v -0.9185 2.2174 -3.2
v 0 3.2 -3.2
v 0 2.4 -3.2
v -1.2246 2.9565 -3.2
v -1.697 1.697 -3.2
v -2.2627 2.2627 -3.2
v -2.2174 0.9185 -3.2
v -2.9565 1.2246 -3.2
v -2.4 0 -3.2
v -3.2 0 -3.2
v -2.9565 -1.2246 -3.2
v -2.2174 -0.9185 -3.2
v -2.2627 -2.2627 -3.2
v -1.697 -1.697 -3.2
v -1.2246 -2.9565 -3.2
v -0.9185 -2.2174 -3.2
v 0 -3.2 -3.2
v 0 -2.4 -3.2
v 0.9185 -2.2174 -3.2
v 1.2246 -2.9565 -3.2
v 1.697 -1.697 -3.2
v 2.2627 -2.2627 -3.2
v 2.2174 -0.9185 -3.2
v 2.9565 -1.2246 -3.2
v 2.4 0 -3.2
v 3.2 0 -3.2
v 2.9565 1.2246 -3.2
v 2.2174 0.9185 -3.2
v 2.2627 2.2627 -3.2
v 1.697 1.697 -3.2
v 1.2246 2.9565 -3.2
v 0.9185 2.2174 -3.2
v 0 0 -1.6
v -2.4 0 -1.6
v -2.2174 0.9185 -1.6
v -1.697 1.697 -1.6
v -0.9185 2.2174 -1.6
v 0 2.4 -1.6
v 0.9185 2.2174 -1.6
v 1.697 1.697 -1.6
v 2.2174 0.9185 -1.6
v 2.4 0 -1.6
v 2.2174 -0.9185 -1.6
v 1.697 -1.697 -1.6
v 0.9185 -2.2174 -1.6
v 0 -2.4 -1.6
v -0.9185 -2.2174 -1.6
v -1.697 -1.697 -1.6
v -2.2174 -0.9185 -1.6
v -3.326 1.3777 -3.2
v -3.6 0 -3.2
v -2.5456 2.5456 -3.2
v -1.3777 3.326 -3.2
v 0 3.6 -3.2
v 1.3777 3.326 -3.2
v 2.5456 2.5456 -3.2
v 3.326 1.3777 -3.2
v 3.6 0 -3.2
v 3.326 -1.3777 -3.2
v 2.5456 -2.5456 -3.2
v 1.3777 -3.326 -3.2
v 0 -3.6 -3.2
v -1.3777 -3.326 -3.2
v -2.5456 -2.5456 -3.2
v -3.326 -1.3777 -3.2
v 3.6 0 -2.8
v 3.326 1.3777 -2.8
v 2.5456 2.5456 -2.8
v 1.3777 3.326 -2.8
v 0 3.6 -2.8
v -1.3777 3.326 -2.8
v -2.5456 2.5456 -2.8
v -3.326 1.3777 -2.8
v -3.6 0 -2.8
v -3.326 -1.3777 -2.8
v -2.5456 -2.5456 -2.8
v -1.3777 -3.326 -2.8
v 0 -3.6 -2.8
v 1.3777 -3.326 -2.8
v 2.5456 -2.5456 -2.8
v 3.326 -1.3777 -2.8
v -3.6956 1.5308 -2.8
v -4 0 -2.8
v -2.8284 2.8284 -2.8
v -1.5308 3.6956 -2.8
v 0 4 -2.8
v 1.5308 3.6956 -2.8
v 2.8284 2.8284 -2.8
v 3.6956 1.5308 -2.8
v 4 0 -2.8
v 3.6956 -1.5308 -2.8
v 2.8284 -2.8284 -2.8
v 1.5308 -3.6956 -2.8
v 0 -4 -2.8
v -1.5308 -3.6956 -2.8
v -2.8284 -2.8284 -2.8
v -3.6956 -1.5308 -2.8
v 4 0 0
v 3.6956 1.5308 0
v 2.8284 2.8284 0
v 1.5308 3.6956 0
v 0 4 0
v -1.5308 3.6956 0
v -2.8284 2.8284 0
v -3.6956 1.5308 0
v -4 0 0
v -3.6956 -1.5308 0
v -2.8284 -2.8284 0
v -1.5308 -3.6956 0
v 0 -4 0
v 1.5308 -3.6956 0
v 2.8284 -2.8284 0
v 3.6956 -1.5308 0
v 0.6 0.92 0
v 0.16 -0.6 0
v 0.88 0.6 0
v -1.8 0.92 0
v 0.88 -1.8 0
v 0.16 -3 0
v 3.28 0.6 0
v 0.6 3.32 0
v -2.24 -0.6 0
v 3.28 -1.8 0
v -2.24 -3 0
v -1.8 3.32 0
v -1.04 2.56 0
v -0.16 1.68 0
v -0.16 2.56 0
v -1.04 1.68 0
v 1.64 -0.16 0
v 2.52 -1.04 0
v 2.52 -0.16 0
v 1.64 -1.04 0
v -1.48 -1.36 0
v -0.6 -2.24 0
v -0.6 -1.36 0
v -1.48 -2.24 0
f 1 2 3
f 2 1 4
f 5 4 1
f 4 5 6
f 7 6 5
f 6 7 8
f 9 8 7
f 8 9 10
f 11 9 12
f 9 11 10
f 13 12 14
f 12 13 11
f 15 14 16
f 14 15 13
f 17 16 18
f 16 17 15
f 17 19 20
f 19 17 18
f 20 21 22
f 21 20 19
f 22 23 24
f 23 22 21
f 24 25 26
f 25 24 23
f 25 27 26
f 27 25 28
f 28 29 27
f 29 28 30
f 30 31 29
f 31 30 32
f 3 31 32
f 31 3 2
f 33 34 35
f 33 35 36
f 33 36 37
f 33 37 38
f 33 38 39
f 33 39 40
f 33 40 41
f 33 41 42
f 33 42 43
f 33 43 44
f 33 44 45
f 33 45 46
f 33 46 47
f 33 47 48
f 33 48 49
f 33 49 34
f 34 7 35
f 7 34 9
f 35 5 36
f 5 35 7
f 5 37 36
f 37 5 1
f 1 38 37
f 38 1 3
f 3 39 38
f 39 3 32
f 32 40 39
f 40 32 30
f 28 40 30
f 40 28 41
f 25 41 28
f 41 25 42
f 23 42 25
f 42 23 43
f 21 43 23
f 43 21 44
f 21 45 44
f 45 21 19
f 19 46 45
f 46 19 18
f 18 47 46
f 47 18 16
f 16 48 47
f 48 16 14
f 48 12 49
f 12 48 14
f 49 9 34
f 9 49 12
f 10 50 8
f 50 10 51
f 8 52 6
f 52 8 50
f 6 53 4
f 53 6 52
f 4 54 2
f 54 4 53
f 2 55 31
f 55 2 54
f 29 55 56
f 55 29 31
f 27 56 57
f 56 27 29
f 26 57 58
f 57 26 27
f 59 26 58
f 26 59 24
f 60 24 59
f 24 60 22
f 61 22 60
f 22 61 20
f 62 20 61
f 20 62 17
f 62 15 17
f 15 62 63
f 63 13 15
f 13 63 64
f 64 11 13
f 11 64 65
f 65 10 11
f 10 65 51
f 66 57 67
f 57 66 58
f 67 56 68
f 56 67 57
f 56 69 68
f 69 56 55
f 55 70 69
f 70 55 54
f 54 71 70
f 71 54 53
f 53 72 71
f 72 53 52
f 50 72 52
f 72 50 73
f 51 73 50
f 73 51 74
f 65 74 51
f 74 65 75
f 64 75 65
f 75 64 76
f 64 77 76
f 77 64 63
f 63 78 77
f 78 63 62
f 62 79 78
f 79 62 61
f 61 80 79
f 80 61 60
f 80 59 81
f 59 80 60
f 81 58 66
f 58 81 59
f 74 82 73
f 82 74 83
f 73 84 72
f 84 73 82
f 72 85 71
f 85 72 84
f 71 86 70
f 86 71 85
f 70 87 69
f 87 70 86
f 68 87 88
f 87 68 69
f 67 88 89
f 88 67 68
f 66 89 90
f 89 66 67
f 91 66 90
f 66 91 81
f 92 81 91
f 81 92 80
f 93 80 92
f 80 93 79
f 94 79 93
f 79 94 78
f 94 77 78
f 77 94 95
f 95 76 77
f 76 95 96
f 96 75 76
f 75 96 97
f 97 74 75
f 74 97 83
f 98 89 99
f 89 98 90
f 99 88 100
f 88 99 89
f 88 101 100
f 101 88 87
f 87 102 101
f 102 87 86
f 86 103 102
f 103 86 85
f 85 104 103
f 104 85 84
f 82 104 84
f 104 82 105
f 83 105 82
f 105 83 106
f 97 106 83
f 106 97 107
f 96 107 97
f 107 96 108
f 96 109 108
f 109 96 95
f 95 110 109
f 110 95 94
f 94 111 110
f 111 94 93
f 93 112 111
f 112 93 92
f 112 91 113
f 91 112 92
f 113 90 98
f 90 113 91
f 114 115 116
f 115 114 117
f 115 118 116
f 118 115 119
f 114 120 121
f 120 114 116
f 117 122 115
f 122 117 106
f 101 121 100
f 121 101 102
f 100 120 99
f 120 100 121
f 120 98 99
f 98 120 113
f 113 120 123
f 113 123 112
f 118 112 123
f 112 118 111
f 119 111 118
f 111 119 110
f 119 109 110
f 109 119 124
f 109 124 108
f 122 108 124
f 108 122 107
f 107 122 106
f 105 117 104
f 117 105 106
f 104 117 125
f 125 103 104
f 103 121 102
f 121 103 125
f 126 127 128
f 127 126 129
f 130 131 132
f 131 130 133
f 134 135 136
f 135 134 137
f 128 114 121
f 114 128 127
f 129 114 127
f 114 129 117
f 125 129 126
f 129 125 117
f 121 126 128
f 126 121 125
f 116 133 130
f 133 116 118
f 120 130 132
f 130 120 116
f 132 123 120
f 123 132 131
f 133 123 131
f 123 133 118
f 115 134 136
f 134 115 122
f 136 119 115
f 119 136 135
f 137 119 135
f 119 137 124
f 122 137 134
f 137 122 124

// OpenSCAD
// file: ../p/4-4disc.scad
use <../lib.scad>
function ldraw_lib__4_4disc() = [
// 0 Disc 1.0
// 0 Name: 4-4disc.dat
// 0 Author: James Jessiman
// 0 !LDRAW_ORG Primitive UPDATE 2002-02
// 0 !LICENSE Licensed under CC BY 4.0 : see CAreadme.txt
// 
// 0 BFC CERTIFY CCW
  [0,"BFC","CERTIFY"],
  [0,"BFC","CCW"],
// 
// 0 !HISTORY 1998-12-15 [PTadmin] Official Update 1998-10
// 0 !HISTORY 2002-03-23 [sbliss] Added BFC statement
// 0 !HISTORY 2002-04-25 [PTadmin] Official Update 2002-02
// 0 !HISTORY 2007-06-24 [PTadmin] Header formatted for Contributor Agreement
// 0 !HISTORY 2008-07-01 [PTadmin] Official Update 2008-01
// 
// 
// 3 16 0 0 0 1 0 0 0.9239 0 0.3827
  [3,16,0,0,0,1,0,0,0.9239,0,0.3827],
// 3 16 0 0 0 0.9239 0 0.3827 0.7071 0 0.7071
  [3,16,0,0,0,0.9239,0,0.3827,0.7071,0,0.7071],
// 3 16 0 0 0 0.7071 0 0.7071 0.3827 0 0.9239
  [3,16,0,0,0,0.7071,0,0.7071,0.3827,0,0.9239],
// 3 16 0 0 0 0.3827 0 0.9239 0 0 1
  [3,16,0,0,0,0.3827,0,0.9239,0,0,1],
// 3 16 0 0 0 0 0 1 -0.3827 0 0.9239
  [3,16,0,0,0,0,0,1,-0.3827,0,0.9239],
// 3 16 0 0 0 -0.3827 0 0.9239 -0.7071 0 0.7071
  [3,16,0,0,0,-0.3827,0,0.9239,-0.7071,0,0.7071],
// 3 16 0 0 0 -0.7071 0 0.7071 -0.9239 0 0.3827
  [3,16,0,0,0,-0.7071,0,0.7071,-0.9239,0,0.3827],
// 3 16 0 0 0 -0.9239 0 0.3827 -1 0 -0
  [3,16,0,0,0,-0.9239,0,0.3827,-1,0,-0],
// 3 16 0 0 0 -1 0 -0 -0.9239 0 -0.3827
  [3,16,0,0,0,-1,0,-0,-0.9239,0,-0.3827],
// 3 16 0 0 0 -0.9239 0 -0.3827 -0.7071 0 -0.7071
  [3,16,0,0,0,-0.9239,0,-0.3827,-0.7071,0,-0.7071],
// 3 16 0 0 0 -0.7071 0 -0.7071 -0.3827 0 -0.9239
  [3,16,0,0,0,-0.7071,0,-0.7071,-0.3827,0,-0.9239],
// 3 16 0 0 0 -0.3827 0 -0.9239 0 0 -1
  [3,16,0,0,0,-0.3827,0,-0.9239,0,0,-1],
// 3 16 0 0 0 0 0 -1 0.3827 0 -0.9239
  [3,16,0,0,0,0,0,-1,0.3827,0,-0.9239],
// 3 16 0 0 0 0.3827 0 -0.9239 0.7071 0 -0.7071
  [3,16,0,0,0,0.3827,0,-0.9239,0.7071,0,-0.7071],
// 3 16 0 0 0 0.7071 0 -0.7071 0.9239 0 -0.3827
  [3,16,0,0,0,0.7071,0,-0.7071,0.9239,0,-0.3827],
// 3 16 0 0 0 0.9239 0 -0.3827 1 0 0
  [3,16,0,0,0,0.9239,0,-0.3827,1,0,0],
// 0
];
module ldraw_lib__4_4disc(step=0, col=false, unit=2/5, alt=false, line=0.2, solid=!$preview)
    makepoly(ldraw_lib__4_4disc(), step=step, col=col, unit=unit, alt=alt, line=line, solid=solid);
ldraw_lib__4_4disc(line=0.2);
// file: ../p/4-4ring3.scad
use <../lib.scad>
function ldraw_lib__4_4ring3() = [
// 0 Ring  3 x 1.0
// 0 Name: 4-4ring3.dat
// 0 Author: James Jessiman
// 0 !LDRAW_ORG Primitive UPDATE 2009-01
// 0 !LICENSE Licensed under CC BY 4.0 : see CAreadme.txt
// 
// 0 BFC CERTIFY CCW
  [0,"BFC","CERTIFY"],
  [0,"BFC","CCW"],
// 
// 0 !HISTORY 1998-12-15 [PTadmin] Official Update 1998-10
// 0 !HISTORY 2002-04-05 [hafhead] Added BFC statement
// 0 !HISTORY 2002-04-25 [PTadmin] Official Update 2002-02
// 0 !HISTORY 2007-06-24 [PTadmin] Header formatted for Contributor Agreement
// 0 !HISTORY 2008-07-01 [PTadmin] Official Update 2008-01
// 0 !HISTORY 2008-08-26 [cwdee] Switch polygon winding and rename
// 0 !HISTORY 2009-05-02 [PTadmin] Official Update 2009-01
// 
// 
// 4 16 -1.5308 0 3.6956 -1.1481 0 2.7717 0 0 3 0 0 4
  [4,16,-1.5308,0,3.6956,-1.1481,0,2.7717,0,0,3,0,0,4],
// 4 16 -2.8284 0 2.8284 -2.1213 0 2.1213 -1.1481 0 2.7717 -1.5308 0 3.6956
  [4,16,-2.8284,0,2.8284,-2.1213,0,2.1213,-1.1481,0,2.7717,-1.5308,0,3.6956],
// 4 16 -3.6956 0 1.5308 -2.7717 0 1.1481 -2.1213 0 2.1213 -2.8284 0 2.8284
  [4,16,-3.6956,0,1.5308,-2.7717,0,1.1481,-2.1213,0,2.1213,-2.8284,0,2.8284],
// 4 16 -4 0 0 -3 0 0 -2.7717 0 1.1481 -3.6956 0 1.5308
  [4,16,-4,0,0,-3,0,0,-2.7717,0,1.1481,-3.6956,0,1.5308],
// 4 16 -3.6956 0 -1.5308 -2.7717 0 -1.1481 -3 0 0 -4 0 0
  [4,16,-3.6956,0,-1.5308,-2.7717,0,-1.1481,-3,0,0,-4,0,0],
// 4 16 -2.8284 0 -2.8284 -2.1213 0 -2.1213 -2.7717 0 -1.1481 -3.6956 0 -1.5308
  [4,16,-2.8284,0,-2.8284,-2.1213,0,-2.1213,-2.7717,0,-1.1481,-3.6956,0,-1.5308],
// 4 16 -1.5308 0 -3.6956 -1.1481 0 -2.7717 -2.1213 0 -2.1213 -2.8284 0 -2.8284
  [4,16,-1.5308,0,-3.6956,-1.1481,0,-2.7717,-2.1213,0,-2.1213,-2.8284,0,-2.8284],
// 4 16 0 0 -4 0 0 -3 -1.1481 0 -2.7717 -1.5308 0 -3.6956
  [4,16,0,0,-4,0,0,-3,-1.1481,0,-2.7717,-1.5308,0,-3.6956],
// 4 16 1.5308 0 -3.6956 1.1481 0 -2.7717 0 0 -3 0 0 -4
  [4,16,1.5308,0,-3.6956,1.1481,0,-2.7717,0,0,-3,0,0,-4],
// 4 16 2.8284 0 -2.8284 2.1213 0 -2.1213 1.1481 0 -2.7717 1.5308 0 -3.6956
  [4,16,2.8284,0,-2.8284,2.1213,0,-2.1213,1.1481,0,-2.7717,1.5308,0,-3.6956],
// 4 16 3.6956 0 -1.5308 2.7717 0 -1.1481 2.1213 0 -2.1213 2.8284 0 -2.8284
  [4,16,3.6956,0,-1.5308,2.7717,0,-1.1481,2.1213,0,-2.1213,2.8284,0,-2.8284],
// 4 16 4 0 0 3 0 0 2.7717 0 -1.1481 3.6956 0 -1.5308
  [4,16,4,0,0,3,0,0,2.7717,0,-1.1481,3.6956,0,-1.5308],
// 4 16 3.6956 0 1.5308 2.7717 0 1.1481 3 0 0 4 0 0
  [4,16,3.6956,0,1.5308,2.7717,0,1.1481,3,0,0,4,0,0],
// 4 16 2.8284 0 2.8284 2.1213 0 2.1213 2.7717 0 1.1481 3.6956 0 1.5308
  [4,16,2.8284,0,2.8284,2.1213,0,2.1213,2.7717,0,1.1481,3.6956,0,1.5308],
// 4 16 1.5308 0 3.6956 1.1481 0 2.7717 2.1213 0 2.1213 2.8284 0 2.8284
  [4,16,1.5308,0,3.6956,1.1481,0,2.7717,2.1213,0,2.1213,2.8284,0,2.8284],
// 4 16 0 0 4 0 0 3 1.1481 0 2.7717 1.5308 0 3.6956
  [4,16,0,0,4,0,0,3,1.1481,0,2.7717,1.5308,0,3.6956],
// 0
];
module ldraw_lib__4_4ring3(step=0, col=false, unit=2/5, alt=false, line=0.2, solid=!$preview)
    makepoly(ldraw_lib__4_4ring3(), step=step, col=col, unit=unit, alt=alt, line=line, solid=solid);
ldraw_lib__4_4ring3(line=0.2);
// file: ../p/4-4cylc.scad
use <../lib.scad>
use <4-4cyli.scad>
use <4-4disc.scad>
use <4-4edge.scad>
function ldraw_lib__4_4cylc() = [
// 0 Cylinder Closed 1.0
// 0 Name: 4-4cylc.dat
// 0 Author: Alex Taylor [anathema]
// 0 !LDRAW_ORG Primitive UPDATE 2009-02
// 0 !LICENSE Licensed under CC BY 4.0 : see CAreadme.txt
// 
// 0 BFC CERTIFY CCW
  [0,"BFC","CERTIFY"],
  [0,"BFC","CCW"],
// 
// 0 !HISTORY 2008-12-29 [cwdee] Removed one disc
// 0 !HISTORY 2009-09-03 [PTadmin] Official Update 2009-02
// 
// 
// 1 16 0 0 0 1 0 0 0 1 0 0 0 1 4-4edge.dat
  [1,16,0,0,0,1,0,0,0,1,0,0,0,1, ldraw_lib__4_4edge()],
// 1 16 0 1 0 1 0 0 0 1 0 0 0 1 4-4edge.dat
  [1,16,0,1,0,1,0,0,0,1,0,0,0,1, ldraw_lib__4_4edge()],
// 1 16 0 0 0 1 0 0 0 1 0 0 0 1 4-4disc.dat
  [1,16,0,0,0,1,0,0,0,1,0,0,0,1, ldraw_lib__4_4disc()],
// 1 16 0 0 0 1 0 0 0 1 0 0 0 1 4-4cyli.dat
  [1,16,0,0,0,1,0,0,0,1,0,0,0,1, ldraw_lib__4_4cyli()],
// 0
];
module ldraw_lib__4_4cylc(step=0, col=false, unit=2/5, alt=false, line=0.2, solid=!$preview)
    makepoly(ldraw_lib__4_4cylc(), step=step, col=col, unit=unit, alt=alt, line=line, solid=solid);
ldraw_lib__4_4cylc(line=0.2);
// file: ../p/4-4edge.scad
use <../lib.scad>
function ldraw_lib__4_4edge() = [
// 0 Circle 1.0
// 0 Name: 4-4edge.dat
// 0 Author: James Jessiman
// 0 !LDRAW_ORG Primitive UPDATE 2017-01
// 0 !LICENSE Licensed under CC BY 4.0 : see CAreadme.txt
// 
// 0 BFC CERTIFY CCW
  [0,"BFC","CERTIFY"],
  [0,"BFC","CCW"],
// 
// 0 !HISTORY 1998-12-15 [PTadmin] Official Update 1998-10
// 0 !HISTORY 2005-12-28 [PTadmin] Official Update 2005-01
// 0 !HISTORY 2007-06-24 [PTadmin] Header formatted for Contributor Agreement
// 0 !HISTORY 2008-07-01 [PTadmin] Official Update 2008-01
// 0 !HISTORY 2017-01-15 [Steffen] BFCed
// 0 !HISTORY 2017-12-30 [PTadmin] Official Update 2017-01
// 
// 
// 2 24 1 0 0 0.9239 0 0.3827
  [2,24,1,0,0,0.9239,0,0.3827],
// 2 24 0.9239 0 0.3827 0.7071 0 0.7071
  [2,24,0.9239,0,0.3827,0.7071,0,0.7071],
// 2 24 0.7071 0 0.7071 0.3827 0 0.9239
  [2,24,0.7071,0,0.7071,0.3827,0,0.9239],
// 2 24 0.3827 0 0.9239 0 0 1
  [2,24,0.3827,0,0.9239,0,0,1],
// 2 24 0 0 1 -0.3827 0 0.9239
  [2,24,0,0,1,-0.3827,0,0.9239],
// 2 24 -0.3827 0 0.9239 -0.7071 0 0.7071
  [2,24,-0.3827,0,0.9239,-0.7071,0,0.7071],
// 2 24 -0.7071 0 0.7071 -0.9239 0 0.3827
  [2,24,-0.7071,0,0.7071,-0.9239,0,0.3827],
// 2 24 -0.9239 0 0.3827 -1 0 -0
  [2,24,-0.9239,0,0.3827,-1,0,-0],
// 2 24 -1 0 -0 -0.9239 0 -0.3827
  [2,24,-1,0,-0,-0.9239,0,-0.3827],
// 2 24 -0.9239 0 -0.3827 -0.7071 0 -0.7071
  [2,24,-0.9239,0,-0.3827,-0.7071,0,-0.7071],
// 2 24 -0.7071 0 -0.7071 -0.3827 0 -0.9239
  [2,24,-0.7071,0,-0.7071,-0.3827,0,-0.9239],
// 2 24 -0.3827 0 -0.9239 0 0 -1
  [2,24,-0.3827,0,-0.9239,0,0,-1],
// 2 24 0 0 -1 0.3827 0 -0.9239
  [2,24,0,0,-1,0.3827,0,-0.9239],
// 2 24 0.3827 0 -0.9239 0.7071 0 -0.7071
  [2,24,0.3827,0,-0.9239,0.7071,0,-0.7071],
// 2 24 0.7071 0 -0.7071 0.9239 0 -0.3827
  [2,24,0.7071,0,-0.7071,0.9239,0,-0.3827],
// 2 24 0.9239 0 -0.3827 1 0 0
  [2,24,0.9239,0,-0.3827,1,0,0],
];
module ldraw_lib__4_4edge(step=0, col=false, unit=2/5, alt=false, line=0.2, solid=!$preview)
    makepoly(ldraw_lib__4_4edge(), step=step, col=col, unit=unit, alt=alt, line=line, solid=solid);
ldraw_lib__4_4edge(line=0.2);
// file: ../p/4-4cyli.scad
use <../lib.scad>
function ldraw_lib__4_4cyli() = [
// 0 Cylinder 1.0
// 0 Name: 4-4cyli.dat
// 0 Author: James Jessiman
// 0 !LDRAW_ORG Primitive UPDATE 2005-01
// 0 !LICENSE Licensed under CC BY 4.0 : see CAreadme.txt
// 
// 0 BFC CERTIFY CCW
  [0,"BFC","CERTIFY"],
  [0,"BFC","CCW"],
// 
// 0 !HISTORY 1998-12-15 [PTadmin] Official Update 1998-10
// 0 !HISTORY 2002-03-23 [sbliss] Added BFC statement; merged headers from files in distributions LDraw 0.27 and Complete.
// 0 !HISTORY 2002-04-25 [PTadmin] Official Update 2002-02
// 0 !HISTORY 2004-12-14 [guyvivan] BFC CCW
// 0 !HISTORY 2005-12-28 [PTadmin] Official Update 2005-01
// 0 !HISTORY 2007-06-24 [PTadmin] Header formatted for Contributor Agreement
// 0 !HISTORY 2008-07-01 [PTadmin] Official Update 2008-01
// 
// 
// 4 16 1 1 0 0.9239 1 0.3827 0.9239 0 0.3827 1 0 0
  [4,16,1,1,0,0.9239,1,0.3827,0.9239,0,0.3827,1,0,0],
// 5 24 1 0 0 1 1 0 0.9239 0 0.3827 0.9239 0 -0.3827
  [5,24,1,0,0,1,1,0,0.9239,0,0.3827,0.9239,0,-0.3827],
// 4 16 0.9239 1 0.3827 0.7071 1 0.7071 0.7071 0 0.7071 0.9239 0 0.3827
  [4,16,0.9239,1,0.3827,0.7071,1,0.7071,0.7071,0,0.7071,0.9239,0,0.3827],
// 5 24 0.9239 0 0.3827 0.9239 1 0.3827 0.7071 0 0.7071 1 0 0
  [5,24,0.9239,0,0.3827,0.9239,1,0.3827,0.7071,0,0.7071,1,0,0],
// 4 16 0.7071 1 0.7071 0.3827 1 0.9239 0.3827 0 0.9239 0.7071 0 0.7071
  [4,16,0.7071,1,0.7071,0.3827,1,0.9239,0.3827,0,0.9239,0.7071,0,0.7071],
// 5 24 0.7071 0 0.7071 0.7071 1 0.7071 0.3827 0 0.9239 0.9239 0 0.3827
  [5,24,0.7071,0,0.7071,0.7071,1,0.7071,0.3827,0,0.9239,0.9239,0,0.3827],
// 4 16 0.3827 1 0.9239 0 1 1 0 0 1 0.3827 0 0.9239
  [4,16,0.3827,1,0.9239,0,1,1,0,0,1,0.3827,0,0.9239],
// 5 24 0.3827 0 0.9239 0.3827 1 0.9239 0 0 1 0.7071 0 0.7071
  [5,24,0.3827,0,0.9239,0.3827,1,0.9239,0,0,1,0.7071,0,0.7071],
// 4 16 0 1 1 -0.3827 1 0.9239 -0.3827 0 0.9239 0 0 1
  [4,16,0,1,1,-0.3827,1,0.9239,-0.3827,0,0.9239,0,0,1],
// 5 24 0 0 1 0 1 1 -0.3827 0 0.9239 0.3827 0 0.9239
  [5,24,0,0,1,0,1,1,-0.3827,0,0.9239,0.3827,0,0.9239],
// 4 16 -0.3827 1 0.9239 -0.7071 1 0.7071 -0.7071 0 0.7071 -0.3827 0 0.9239
  [4,16,-0.3827,1,0.9239,-0.7071,1,0.7071,-0.7071,0,0.7071,-0.3827,0,0.9239],
// 5 24 -0.3827 0 0.9239 -0.3827 1 0.9239 -0.7071 0 0.7071 0 0 1
  [5,24,-0.3827,0,0.9239,-0.3827,1,0.9239,-0.7071,0,0.7071,0,0,1],
// 4 16 -0.7071 1 0.7071 -0.9239 1 0.3827 -0.9239 0 0.3827 -0.7071 0 0.7071
  [4,16,-0.7071,1,0.7071,-0.9239,1,0.3827,-0.9239,0,0.3827,-0.7071,0,0.7071],
// 5 24 -0.7071 0 0.7071 -0.7071 1 0.7071 -0.9239 0 0.3827 -0.3827 0 0.9239
  [5,24,-0.7071,0,0.7071,-0.7071,1,0.7071,-0.9239,0,0.3827,-0.3827,0,0.9239],
// 4 16 -0.9239 1 0.3827 -1 1 0 -1 0 0 -0.9239 0 0.3827
  [4,16,-0.9239,1,0.3827,-1,1,0,-1,0,0,-0.9239,0,0.3827],
// 5 24 -0.9239 0 0.3827 -0.9239 1 0.3827 -1 0 0 -0.7071 0 0.7071
  [5,24,-0.9239,0,0.3827,-0.9239,1,0.3827,-1,0,0,-0.7071,0,0.7071],
// 4 16 -1 1 0 -0.9239 1 -0.3827 -0.9239 0 -0.3827 -1 0 0
  [4,16,-1,1,0,-0.9239,1,-0.3827,-0.9239,0,-0.3827,-1,0,0],
// 5 24 -1 0 0 -1 1 0 -0.9239 0 -0.3827 -0.9239 0 0.3827
  [5,24,-1,0,0,-1,1,0,-0.9239,0,-0.3827,-0.9239,0,0.3827],
// 4 16 -0.9239 1 -0.3827 -0.7071 1 -0.7071 -0.7071 0 -0.7071 -0.9239 0 -0.3827
  [4,16,-0.9239,1,-0.3827,-0.7071,1,-0.7071,-0.7071,0,-0.7071,-0.9239,0,-0.3827],
// 5 24 -0.9239 0 -0.3827 -0.9239 1 -0.3827 -0.7071 0 -0.7071 -1 0 0
  [5,24,-0.9239,0,-0.3827,-0.9239,1,-0.3827,-0.7071,0,-0.7071,-1,0,0],
// 4 16 -0.7071 1 -0.7071 -0.3827 1 -0.9239 -0.3827 0 -0.9239 -0.7071 0 -0.7071
  [4,16,-0.7071,1,-0.7071,-0.3827,1,-0.9239,-0.3827,0,-0.9239,-0.7071,0,-0.7071],
// 5 24 -0.7071 0 -0.7071 -0.7071 1 -0.7071 -0.3827 0 -0.9239 -0.9239 0 -0.3827
  [5,24,-0.7071,0,-0.7071,-0.7071,1,-0.7071,-0.3827,0,-0.9239,-0.9239,0,-0.3827],
// 4 16 -0.3827 1 -0.9239 0 1 -1 0 0 -1 -0.3827 0 -0.9239
  [4,16,-0.3827,1,-0.9239,0,1,-1,0,0,-1,-0.3827,0,-0.9239],
// 5 24 -0.3827 0 -0.9239 -0.3827 1 -0.9239 0 0 -1 -0.7071 0 -0.7071
  [5,24,-0.3827,0,-0.9239,-0.3827,1,-0.9239,0,0,-1,-0.7071,0,-0.7071],
// 4 16 0 1 -1 0.3827 1 -0.9239 0.3827 0 -0.9239 0 0 -1
  [4,16,0,1,-1,0.3827,1,-0.9239,0.3827,0,-0.9239,0,0,-1],
// 5 24 0 0 -1 0 1 -1 0.3827 0 -0.9239 -0.3827 0 -0.9239
  [5,24,0,0,-1,0,1,-1,0.3827,0,-0.9239,-0.3827,0,-0.9239],
// 4 16 0.3827 1 -0.9239 0.7071 1 -0.7071 0.7071 0 -0.7071 0.3827 0 -0.9239
  [4,16,0.3827,1,-0.9239,0.7071,1,-0.7071,0.7071,0,-0.7071,0.3827,0,-0.9239],
// 5 24 0.3827 0 -0.9239 0.3827 1 -0.9239 0.7071 0 -0.7071 0 0 -1
  [5,24,0.3827,0,-0.9239,0.3827,1,-0.9239,0.7071,0,-0.7071,0,0,-1],
// 4 16 0.7071 1 -0.7071 0.9239 1 -0.3827 0.9239 0 -0.3827 0.7071 0 -0.7071
  [4,16,0.7071,1,-0.7071,0.9239,1,-0.3827,0.9239,0,-0.3827,0.7071,0,-0.7071],
// 5 24 0.7071 0 -0.7071 0.7071 1 -0.7071 0.9239 0 -0.3827 0.3827 0 -0.9239
  [5,24,0.7071,0,-0.7071,0.7071,1,-0.7071,0.9239,0,-0.3827,0.3827,0,-0.9239],
// 4 16 0.9239 1 -0.3827 1 1 0 1 0 0 0.9239 0 -0.3827
  [4,16,0.9239,1,-0.3827,1,1,0,1,0,0,0.9239,0,-0.3827],
// 5 24 0.9239 0 -0.3827 0.9239 1 -0.3827 1 0 0 0.7071 0 -0.7071
  [5,24,0.9239,0,-0.3827,0.9239,1,-0.3827,1,0,0,0.7071,0,-0.7071],
// 0
];
module ldraw_lib__4_4cyli(step=0, col=false, unit=2/5, alt=false, line=0.2, solid=!$preview)
    makepoly(ldraw_lib__4_4cyli(), step=step, col=col, unit=unit, alt=alt, line=line, solid=solid);
ldraw_lib__4_4cyli(line=0.2);
// file: ../p/empty.scad
use <../lib.scad>
function ldraw_lib__empty() = [
// 0 Empty
// 0 Name: empty.dat
// 0 Author: Steffen [Steffen]
// 0 !LDRAW_ORG Primitive UPDATE 2015-01
// 0 !LICENSE Licensed under CC BY 4.0 : see CAreadme.txt
// 
// 0 BFC CERTIFY CCW
  [0,"BFC","CERTIFY"],
  [0,"BFC","CCW"],
// 
// 0 !HISTORY 2015-10-11 [PTadmin] Official Update 2015-01
// 
// 
// 0 // Tool MLCad cannot handle really empty files. This file is used as a workaround.
// 0 // It exceptionally contains forbidden non-LDRAW standard syntax to satisfy MLCad until it is fixed OR a different editor has become the de-facto LDRAW standard.
// 0 // The line being used here is an "impossible" conditional line which never should be visible,
// 0 // additionally hidden by a syntax explicitly hiding it from displaying.
// 
// 0 MLCAD HIDE 5 24 0 0 0 0.0001 0 0 0.0001 -0.0001 0 0 0 0
];
module ldraw_lib__empty(step=0, col=false, unit=2/5, alt=false, line=0.2, solid=!$preview)
    makepoly(ldraw_lib__empty(), step=step, col=col, unit=unit, alt=alt, line=line, solid=solid);
ldraw_lib__empty(line=0.2);
// file: ../p/stud4o.scad
use <../lib.scad>
use <4-4cylc.scad>
use <4-4ring3.scad>
function ldraw_lib__stud4o() = [
// 0 Stud Tube Open without Outer Cylinder
// 0 Name: stud4o.dat
// 0 Author: Magnus Forsberg [MagFors]
// 0 !LDRAW_ORG Primitive UPDATE 2011-02
// 0 !LICENSE Licensed under CC BY 4.0 : see CAreadme.txt
// 
// 0 !HELP This stud is a "antistud" to be used like a underside stud,
// 0 !HELP but without the outer cylinder.
// 0 !HELP 1 47 0 0 0 1 0 0 0 1 0 0 0 1 stud4.dat
// 
// 0 BFC CERTIFY CCW
  [0,"BFC","CERTIFY"],
  [0,"BFC","CCW"],
// 
// 0 !HISTORY 2011-12-29 [PTadmin] Official Update 2011-02
// 
// 
// 1 16 0 -4 0 2 0 0 0 1 0 0 0 2 4-4ring3.dat
  [1,16,0,-4,0,2,0,0,0,1,0,0,0,2, ldraw_lib__4_4ring3()],
// 0 BFC INVERTNEXT
  [0,"BFC","INVERTNEXT"],
// 1 16 0 0 0 -6 0 0 0 -4 0 0 0 6 4-4cylc.dat
  [1,16,0,0,0,-6,0,0,0,-4,0,0,0,6, ldraw_lib__4_4cylc()],
];
module ldraw_lib__stud4o(step=0, col=false, unit=2/5, alt=false, line=0.2, solid=!$preview)
    makepoly(ldraw_lib__stud4o(), step=step, col=col, unit=unit, alt=alt, line=line, solid=solid);
ldraw_lib__stud4o(line=0.2);
// file: ../p/4-4ring9.scad
use <../lib.scad>
function ldraw_lib__4_4ring9() = [
// 0 Ring  9 x 1.0
// 0 Name: 4-4ring9.dat
// 0 Author: Magnus Forsberg [MagFors]
// 0 !LDRAW_ORG Primitive UPDATE 2024-01
// 0 !LICENSE Licensed under CC BY 4.0 : see CAreadme.txt
// 
// 0 BFC CERTIFY CCW
  [0,"BFC","CERTIFY"],
  [0,"BFC","CCW"],
// 
// 0 !HISTORY 2004-04-22 [PTadmin] Official Update 2004-02
// 0 !HISTORY 2007-06-24 [PTadmin] Header formatted for Contributor Agreement
// 0 !HISTORY 2008-07-01 [PTadmin] Official Update 2008-01
// 0 !HISTORY 2024-01-04 [MagFors] Complete regeneration, original by jriley
// 0 !HISTORY 2024-01-29 [OrionP] Official Update 2024-01
// 
// 4 16 10 0 0 9.239 0 3.827 8.3151 0 3.4443 9 0 0
  [4,16,10,0,0,9.239,0,3.827,8.3151,0,3.4443,9,0,0],
// 4 16 9.239 0 3.827 7.071 0 7.071 6.3639 0 6.3639 8.3151 0 3.4443
  [4,16,9.239,0,3.827,7.071,0,7.071,6.3639,0,6.3639,8.3151,0,3.4443],
// 4 16 7.071 0 7.071 3.827 0 9.239 3.4443 0 8.3151 6.3639 0 6.3639
  [4,16,7.071,0,7.071,3.827,0,9.239,3.4443,0,8.3151,6.3639,0,6.3639],
// 4 16 3.827 0 9.239 0 0 10 0 0 9 3.4443 0 8.3151
  [4,16,3.827,0,9.239,0,0,10,0,0,9,3.4443,0,8.3151],
// 4 16 0 0 10 -3.827 0 9.239 -3.4443 0 8.3151 0 0 9
  [4,16,0,0,10,-3.827,0,9.239,-3.4443,0,8.3151,0,0,9],
// 4 16 -3.827 0 9.239 -7.071 0 7.071 -6.3639 0 6.3639 -3.4443 0 8.3151
  [4,16,-3.827,0,9.239,-7.071,0,7.071,-6.3639,0,6.3639,-3.4443,0,8.3151],
// 4 16 -7.071 0 7.071 -9.239 0 3.827 -8.3151 0 3.4443 -6.3639 0 6.3639
  [4,16,-7.071,0,7.071,-9.239,0,3.827,-8.3151,0,3.4443,-6.3639,0,6.3639],
// 4 16 -9.239 0 3.827 -10 0 0 -9 0 0 -8.3151 0 3.4443
  [4,16,-9.239,0,3.827,-10,0,0,-9,0,0,-8.3151,0,3.4443],
// 4 16 -10 0 0 -9.239 0 -3.827 -8.3151 0 -3.4443 -9 0 0
  [4,16,-10,0,0,-9.239,0,-3.827,-8.3151,0,-3.4443,-9,0,0],
// 4 16 -9.239 0 -3.827 -7.071 0 -7.071 -6.3639 0 -6.3639 -8.3151 0 -3.4443
  [4,16,-9.239,0,-3.827,-7.071,0,-7.071,-6.3639,0,-6.3639,-8.3151,0,-3.4443],
// 4 16 -7.071 0 -7.071 -3.827 0 -9.239 -3.4443 0 -8.3151 -6.3639 0 -6.3639
  [4,16,-7.071,0,-7.071,-3.827,0,-9.239,-3.4443,0,-8.3151,-6.3639,0,-6.3639],
// 4 16 -3.827 0 -9.239 0 0 -10 0 0 -9 -3.4443 0 -8.3151
  [4,16,-3.827,0,-9.239,0,0,-10,0,0,-9,-3.4443,0,-8.3151],
// 4 16 0 0 -10 3.827 0 -9.239 3.4443 0 -8.3151 0 0 -9
  [4,16,0,0,-10,3.827,0,-9.239,3.4443,0,-8.3151,0,0,-9],
// 4 16 3.827 0 -9.239 7.071 0 -7.071 6.3639 0 -6.3639 3.4443 0 -8.3151
  [4,16,3.827,0,-9.239,7.071,0,-7.071,6.3639,0,-6.3639,3.4443,0,-8.3151],
// 4 16 7.071 0 -7.071 9.239 0 -3.827 8.3151 0 -3.4443 6.3639 0 -6.3639
  [4,16,7.071,0,-7.071,9.239,0,-3.827,8.3151,0,-3.4443,6.3639,0,-6.3639],
// 4 16 9.239 0 -3.827 10 0 0 9 0 0 8.3151 0 -3.4443
  [4,16,9.239,0,-3.827,10,0,0,9,0,0,8.3151,0,-3.4443],
// 0 // Build by LDPartEditor (PrimGen 2.X)
];
module ldraw_lib__4_4ring9(step=0, col=false, unit=2/5, alt=false, line=0.2, solid=!$preview)
    makepoly(ldraw_lib__4_4ring9(), step=step, col=col, unit=unit, alt=alt, line=line, solid=solid);
ldraw_lib__4_4ring9(line=0.2);
// file: ../p/4-4ring8.scad
use <../lib.scad>
function ldraw_lib__4_4ring8() = [
// 0 Ring  8 x 1.0
// 0 Name: 4-4ring8.dat
// 0 Author: Steffen [Steffen]
// 0 !LDRAW_ORG Primitive UPDATE 2012-01
// 0 !LICENSE Licensed under CC BY 4.0 : see CAreadme.txt
// 
// 0 BFC CERTIFY CCW
  [0,"BFC","CERTIFY"],
  [0,"BFC","CCW"],
// 
// 0 !HISTORY 2003-12-19 [PTadmin] Official Update 2003-03
// 0 !HISTORY 2007-06-24 [PTadmin] Header formatted for Contributor Agreement
// 0 !HISTORY 2008-07-01 [PTadmin] Official Update 2008-01
// 0 !HISTORY 2012-02-16 [Philo] Changed to CCW
// 0 !HISTORY 2012-03-30 [PTadmin] Official Update 2012-01
// 
// 
// 4 16 9 0 0 8.3151 0 3.4443 7.3912 0 3.0616 8 0 0
  [4,16,9,0,0,8.3151,0,3.4443,7.3912,0,3.0616,8,0,0],
// 4 16 8.3151 0 3.4443 6.3639 0 6.3639 5.6568 0 5.6568 7.3912 0 3.0616
  [4,16,8.3151,0,3.4443,6.3639,0,6.3639,5.6568,0,5.6568,7.3912,0,3.0616],
// 4 16 6.3639 0 6.3639 3.4443 0 8.3151 3.0616 0 7.3912 5.6568 0 5.6568
  [4,16,6.3639,0,6.3639,3.4443,0,8.3151,3.0616,0,7.3912,5.6568,0,5.6568],
// 4 16 3.4443 0 8.3151 0 0 9 0 0 8 3.0616 0 7.3912
  [4,16,3.4443,0,8.3151,0,0,9,0,0,8,3.0616,0,7.3912],
// 4 16 0 0 9 -3.4443 0 8.3151 -3.0616 0 7.3912 0 0 8
  [4,16,0,0,9,-3.4443,0,8.3151,-3.0616,0,7.3912,0,0,8],
// 4 16 -3.4443 0 8.3151 -6.3639 0 6.3639 -5.6568 0 5.6568 -3.0616 0 7.3912
  [4,16,-3.4443,0,8.3151,-6.3639,0,6.3639,-5.6568,0,5.6568,-3.0616,0,7.3912],
// 4 16 -6.3639 0 6.3639 -8.3151 0 3.4443 -7.3912 0 3.0616 -5.6568 0 5.6568
  [4,16,-6.3639,0,6.3639,-8.3151,0,3.4443,-7.3912,0,3.0616,-5.6568,0,5.6568],
// 4 16 -8.3151 0 3.4443 -9 0 0 -8 0 0 -7.3912 0 3.0616
  [4,16,-8.3151,0,3.4443,-9,0,0,-8,0,0,-7.3912,0,3.0616],
// 4 16 -9 0 0 -8.3151 0 -3.4443 -7.3912 0 -3.0616 -8 0 0
  [4,16,-9,0,0,-8.3151,0,-3.4443,-7.3912,0,-3.0616,-8,0,0],
// 4 16 -8.3151 0 -3.4443 -6.3639 0 -6.3639 -5.6568 0 -5.6568 -7.3912 0 -3.0616
  [4,16,-8.3151,0,-3.4443,-6.3639,0,-6.3639,-5.6568,0,-5.6568,-7.3912,0,-3.0616],
// 4 16 -6.3639 0 -6.3639 -3.4443 0 -8.3151 -3.0616 0 -7.3912 -5.6568 0 -5.6568
  [4,16,-6.3639,0,-6.3639,-3.4443,0,-8.3151,-3.0616,0,-7.3912,-5.6568,0,-5.6568],
// 4 16 -3.4443 0 -8.3151 0 0 -9 0 0 -8 -3.0616 0 -7.3912
  [4,16,-3.4443,0,-8.3151,0,0,-9,0,0,-8,-3.0616,0,-7.3912],
// 4 16 0 0 -9 3.4443 0 -8.3151 3.0616 0 -7.3912 0 0 -8
  [4,16,0,0,-9,3.4443,0,-8.3151,3.0616,0,-7.3912,0,0,-8],
// 4 16 3.4443 0 -8.3151 6.3639 0 -6.3639 5.6568 0 -5.6568 3.0616 0 -7.3912
  [4,16,3.4443,0,-8.3151,6.3639,0,-6.3639,5.6568,0,-5.6568,3.0616,0,-7.3912],
// 4 16 6.3639 0 -6.3639 8.3151 0 -3.4443 7.3912 0 -3.0616 5.6568 0 -5.6568
  [4,16,6.3639,0,-6.3639,8.3151,0,-3.4443,7.3912,0,-3.0616,5.6568,0,-5.6568],
// 4 16 8.3151 0 -3.4443 9 0 0 8 0 0 7.3912 0 -3.0616
  [4,16,8.3151,0,-3.4443,9,0,0,8,0,0,7.3912,0,-3.0616],
];
module ldraw_lib__4_4ring8(step=0, col=false, unit=2/5, alt=false, line=0.2, solid=!$preview)
    makepoly(ldraw_lib__4_4ring8(), step=step, col=col, unit=unit, alt=alt, line=line, solid=solid);
ldraw_lib__4_4ring8(line=0.2);
// file: ../p/4-4cylo.scad
use <../lib.scad>
use <4-4cyli.scad>
use <4-4edge.scad>
function ldraw_lib__4_4cylo() = [
// 0 Cylinder Open 1.0
// 0 Name: 4-4cylo.dat
// 0 Author: Mark Kennedy [mkennedy]
// 0 !LDRAW_ORG Primitive UPDATE 2010-01
// 0 !LICENSE Licensed under CC BY 4.0 : see CAreadme.txt
// 
// 0 BFC CERTIFY CCW
  [0,"BFC","CERTIFY"],
  [0,"BFC","CCW"],
// 
// 0 !HISTORY 2010-04-05 [PTadmin] Official Update 2010-01
// 
// 
// 1 16 0 0 0 1 0 0 0 1 0 0 0 1 4-4edge.dat
  [1,16,0,0,0,1,0,0,0,1,0,0,0,1, ldraw_lib__4_4edge()],
// 1 16 0 1 0 1 0 0 0 1 0 0 0 1 4-4edge.dat
  [1,16,0,1,0,1,0,0,0,1,0,0,0,1, ldraw_lib__4_4edge()],
// 1 16 0 0 0 1 0 0 0 1 0 0 0 1 4-4cyli.dat
  [1,16,0,0,0,1,0,0,0,1,0,0,0,1, ldraw_lib__4_4cyli()],
// 0
];
module ldraw_lib__4_4cylo(step=0, col=false, unit=2/5, alt=false, line=0.2, solid=!$preview)
    makepoly(ldraw_lib__4_4cylo(), step=step, col=col, unit=unit, alt=alt, line=line, solid=solid);
ldraw_lib__4_4cylo(line=0.2);
// file: ../p/1-16chrd.scad
use <../lib.scad>
use <empty.scad>
function ldraw_lib__1_16chrd() = [
// 0 Chord 0.0625
// 0 Name: 1-16chrd.dat
// 0 Author: Philippe Hurbain [Philo]
// 0 !LDRAW_ORG Primitive UPDATE 2015-01
// 0 !LICENSE Licensed under CC BY 4.0 : see CAreadme.txt
// 
// 0 BFC CERTIFY CCW
  [0,"BFC","CERTIFY"],
  [0,"BFC","CCW"],
// 
// 0 !HISTORY 2015-10-11 [PTadmin] Official Update 2015-01
// 
// 
// 0 // This file is intentionally empty because at the current \P resolution,
// 0 // an 1-16chrd is actually empty. However, this file still is present
// 0 // to allow tools to do primitives substition and fill in a real chrd here,
// 0 // or, if desired, to substitute this with the hi-res 48\1-16chrd.
// 
// 0 // This file is based on an idea by Darats at http://forums.ldraw.org/read.php?19,14500,14500#msg-14500
// 
// 1 16 0 0 0 1 0 0 0 1 0 0 0 1 empty.dat
  [1,16,0,0,0,1,0,0,0,1,0,0,0,1, ldraw_lib__empty()],
];
module ldraw_lib__1_16chrd(step=0, col=false, unit=2/5, alt=false, line=0.2, solid=!$preview)
    makepoly(ldraw_lib__1_16chrd(), step=step, col=col, unit=unit, alt=alt, line=line, solid=solid);
ldraw_lib__1_16chrd(line=0.2);
// file: s/98138s02.scad
use <../../lib.scad>
use <../../p/4-4cylo.scad>
use <../../p/4-4ring8.scad>
use <../../p/4-4ring9.scad>
use <../../p/stud4o.scad>
function ldraw_lib__s__98138s02() = [
// 0 ~Tile  1 x  1 Round with Groove without Complete Top Face
// 0 Name: s\98138s02.dat
// 0 Author: Magnus Forsberg [MagFors]
// 0 !LDRAW_ORG Subpart UPDATE 2020-01
// 0 !LICENSE Licensed under CC BY 4.0 : see CAreadme.txt
// 
// 0 BFC CERTIFY CCW
  [0,"BFC","CERTIFY"],
  [0,"BFC","CCW"],
// 
// 0 !HISTORY 2020-06-28 [PTadmin] Official Update 2020-01
// 
// 
// 1 16 0 4 0 1 0 0 0 -1 0 0 0 1 stud4o.dat
  [1,16,0,4,0,1,0,0,0,-1,0,0,0,1, ldraw_lib__stud4o()],
// 1 16 0 8 0 -1 0 0 0 -1 0 0 0 1 4-4ring8.dat
  [1,16,0,8,0,-1,0,0,0,-1,0,0,0,1, ldraw_lib__4_4ring8()],
// 1 16 0 7 0 9 0 0 0 1 0 0 0 9 4-4cylo.dat
  [1,16,0,7,0,9,0,0,0,1,0,0,0,9, ldraw_lib__4_4cylo()],
// 1 16 0 7 0 -1 0 0 0 -1 0 0 0 1 4-4ring9.dat
  [1,16,0,7,0,-1,0,0,0,-1,0,0,0,1, ldraw_lib__4_4ring9()],
// 1 16 0 0 0 10 0 0 0 7 0 0 0 10 4-4cylo.dat
  [1,16,0,0,0,10,0,0,0,7,0,0,0,10, ldraw_lib__4_4cylo()],
];
module ldraw_lib__s__98138s02(step=0, col=false, unit=2/5, alt=false, line=0.2, solid=!$preview)
    makepoly(ldraw_lib__s__98138s02(), step=step, col=col, unit=unit, alt=alt, line=line, solid=solid);
ldraw_lib__s__98138s02(line=0.2);
// file: ../p/4-4ering.scad
use <../lib.scad>
use <1-16chrd.scad>
function ldraw_lib__4_4ering() = [
// 0 Adapter Ring Triangles to Normal 1.0
// 0 Name: 4-4ering.dat
// 0 Author: Philippe Hurbain [Philo]
// 0 !LDRAW_ORG Primitive UPDATE 2015-01
// 0 !LICENSE Licensed under CC BY 4.0 : see CAreadme.txt
// 
// 0 BFC CERTIFY CCW
  [0,"BFC","CERTIFY"],
  [0,"BFC","CCW"],
// 
// 0 !HISTORY 2015-10-11 [PTadmin] Official Update 2015-01
// 
// 
// 0 // This file uses 1-16chrd (actually empty). It allows
// 0 // tools to do primitives substition and fill in a ring of chrd here,
// 0 // or, if desired, to substitute this with the hi-res 48\1-16chrd.
// 0 // This file is based on an idea by Darats at http://forums.ldraw.org/read.php?19,14500,14500#msg-14500
// 
// 1 16 0 0 0 1 0 0 0 1 0 0 0 1 1-16chrd.dat
  [1,16,0,0,0,1,0,0,0,1,0,0,0,1, ldraw_lib__1_16chrd()],
// 1 16 0 0 0 0.92388 0 0.38268 0 1 0 -0.38268 0 0.92388 1-16chrd.dat
  [1,16,0,0,0,0.92388,0,0.38268,0,1,0,-0.38268,0,0.92388, ldraw_lib__1_16chrd()],
// 1 16 0 0 0 0.70711 0 0.70711 0 1 0 -0.70711 0 0.70711 1-16chrd.dat
  [1,16,0,0,0,0.70711,0,0.70711,0,1,0,-0.70711,0,0.70711, ldraw_lib__1_16chrd()],
// 1 16 0 0 0 0.38268 0 0.92388 0 1 0 -0.92388 0 0.38268 1-16chrd.dat
  [1,16,0,0,0,0.38268,0,0.92388,0,1,0,-0.92388,0,0.38268, ldraw_lib__1_16chrd()],
// 1 16 0 0 0 0 0 1 0 1 0 -1 0 0 1-16chrd.dat
  [1,16,0,0,0,0,0,1,0,1,0,-1,0,0, ldraw_lib__1_16chrd()],
// 1 16 0 0 0 -0.38268 0 0.92388 0 1 0 -0.92388 0 -0.38268 1-16chrd.dat
  [1,16,0,0,0,-0.38268,0,0.92388,0,1,0,-0.92388,0,-0.38268, ldraw_lib__1_16chrd()],
// 1 16 0 0 0 -0.70711 0 0.70711 0 1 0 -0.70711 0 -0.70711 1-16chrd.dat
  [1,16,0,0,0,-0.70711,0,0.70711,0,1,0,-0.70711,0,-0.70711, ldraw_lib__1_16chrd()],
// 1 16 0 0 0 -0.92388 0 0.38268 0 1 0 -0.38268 0 -0.92388 1-16chrd.dat
  [1,16,0,0,0,-0.92388,0,0.38268,0,1,0,-0.38268,0,-0.92388, ldraw_lib__1_16chrd()],
// 1 16 0 0 0 0 0 -1 0 1 0 1 0 0 1-16chrd.dat
  [1,16,0,0,0,0,0,-1,0,1,0,1,0,0, ldraw_lib__1_16chrd()],
// 1 16 0 0 0 0.38268 0 -0.92388 0 1 0 0.92388 0 0.38268 1-16chrd.dat
  [1,16,0,0,0,0.38268,0,-0.92388,0,1,0,0.92388,0,0.38268, ldraw_lib__1_16chrd()],
// 1 16 0 0 0 0.70711 0 -0.70711 0 1 0 0.70711 0 0.70711 1-16chrd.dat
  [1,16,0,0,0,0.70711,0,-0.70711,0,1,0,0.70711,0,0.70711, ldraw_lib__1_16chrd()],
// 1 16 0 0 0 0.92388 0 -0.38268 0 1 0 0.38268 0 0.92388 1-16chrd.dat
  [1,16,0,0,0,0.92388,0,-0.38268,0,1,0,0.38268,0,0.92388, ldraw_lib__1_16chrd()],
// 1 16 0 0 0 -1 0 0 0 1 0 0 0 -1 1-16chrd.dat
  [1,16,0,0,0,-1,0,0,0,1,0,0,0,-1, ldraw_lib__1_16chrd()],
// 1 16 0 0 0 -0.92388 0 -0.38268 0 1 0 0.38268 0 -0.92388 1-16chrd.dat
  [1,16,0,0,0,-0.92388,0,-0.38268,0,1,0,0.38268,0,-0.92388, ldraw_lib__1_16chrd()],
// 1 16 0 0 0 -0.70711 0 -0.70711 0 1 0 0.70711 0 -0.70711 1-16chrd.dat
  [1,16,0,0,0,-0.70711,0,-0.70711,0,1,0,0.70711,0,-0.70711, ldraw_lib__1_16chrd()],
// 1 16 0 0 0 -0.38268 0 -0.92388 0 1 0 0.92388 0 -0.38268 1-16chrd.dat
  [1,16,0,0,0,-0.38268,0,-0.92388,0,1,0,0.92388,0,-0.38268, ldraw_lib__1_16chrd()],
];
module ldraw_lib__4_4ering(step=0, col=false, unit=2/5, alt=false, line=0.2, solid=!$preview)
    makepoly(ldraw_lib__4_4ering(), step=step, col=col, unit=unit, alt=alt, line=line, solid=solid);
ldraw_lib__4_4ering(line=0.2);
// main file
use <../lib.scad>
use <../p/4-4ering.scad>
use <s/98138s02.scad>
function ldraw_lib__98138pxj() = [
// 0 Tile  1 x  1 Round with Black and Dark Bluish Grey Squares within Light Bluish Grey Squares Pattern
// 0 Name: 98138pxj.dat
// 0 Author: Vincent Messenet [Cheenzo]
// 0 !LDRAW_ORG Part UPDATE 2024-06
// 0 !LICENSE Licensed under CC BY 4.0 : see CAreadme.txt
// 
// 0 BFC CERTIFY CCW
  [0,"BFC","CERTIFY"],
  [0,"BFC","CCW"],
// 
// 0 !KEYWORDS Bricklink 98138pb384, Frogspawn, Minecraft, Set 21248, Set 21256
// 
// 0 !HISTORY 2024-07-29 [OrionP] Official Update 2024-06
// 
// 1 16 0 0 0 1 0 0 0 1 0 0 0 1 s\98138s02.dat
  [1,16,0,0,0,1,0,0,0,1,0,0,0,1, ldraw_lib__s__98138s02()],
// 1 16 0 0 0 10 0 0 0 1 0 0 0 10 4-4ering.dat
  [1,16,0,0,0,10,0,0,0,1,0,0,0,10, ldraw_lib__4_4ering()],
// 4 16 -4.5 0 2.3 .4 0 -1.5 2.2 0 1.5 1.5 0 2.3
  [4,16,-4.5,0,2.3,.4,0,-1.5,2.2,0,1.5,1.5,0,2.3],
// 4 16 .4 0 -7.5 2.2 0 -4.5 2.2 0 1.5 .4 0 -1.5
  [4,16,.4,0,-7.5,2.2,0,-4.5,2.2,0,1.5,.4,0,-1.5],
// 4 16 1.5 0 8.3 1.5 0 2.3 2.2 0 1.5 8.2 0 1.5
  [4,16,1.5,0,8.3,1.5,0,2.3,2.2,0,1.5,8.2,0,1.5],
// 4 16 -10 0 0 -5.6 0 -1.5 .4 0 -1.5 -4.5 0 2.3
  [4,16,-10,0,0,-5.6,0,-1.5,.4,0,-1.5,-4.5,0,2.3],
// 4 16 0 0 10 1.5 0 8.3 7.071 0 7.071 3.827 0 9.239
  [4,16,0,0,10,1.5,0,8.3,7.071,0,7.071,3.827,0,9.239],
// 4 16 1.5 0 8.3 8.2 0 1.5 9.239 0 3.827 7.071 0 7.071
  [4,16,1.5,0,8.3,8.2,0,1.5,9.239,0,3.827,7.071,0,7.071],
// 4 16 9.239 0 -3.827 10 0 0 9.239 0 3.827 8.2 0 1.5
  [4,16,9.239,0,-3.827,10,0,0,9.239,0,3.827,8.2,0,1.5],
// 3 16 9.239 0 -3.827 8.2 0 1.5 8.2 0 -4.5
  [3,16,9.239,0,-3.827,8.2,0,1.5,8.2,0,-4.5],
// 3 16 9.239 0 -3.827 8.2 0 -4.5 7.071 0 -7.071
  [3,16,9.239,0,-3.827,8.2,0,-4.5,7.071,0,-7.071],
// 4 16 8.2 0 -4.5 2.2 0 -4.5 3.827 0 -9.239 7.071 0 -7.071
  [4,16,8.2,0,-4.5,2.2,0,-4.5,3.827,0,-9.239,7.071,0,-7.071],
// 4 16 2.2 0 -4.5 .4 0 -7.5 0 0 -10 3.827 0 -9.239
  [4,16,2.2,0,-4.5,.4,0,-7.5,0,0,-10,3.827,0,-9.239],
// 4 16 -5.6 0 -7.5 -3.827 0 -9.239 0 0 -10 .4 0 -7.5
  [4,16,-5.6,0,-7.5,-3.827,0,-9.239,0,0,-10,.4,0,-7.5],
// 3 16 -3.827 0 -9.239 -5.6 0 -7.5 -7.071 0 -7.071
  [3,16,-3.827,0,-9.239,-5.6,0,-7.5,-7.071,0,-7.071],
// 4 16 -5.6 0 -7.5 -5.6 0 -1.5 -9.239 0 -3.827 -7.071 0 -7.071
  [4,16,-5.6,0,-7.5,-5.6,0,-1.5,-9.239,0,-3.827,-7.071,0,-7.071],
// 3 16 -9.239 0 -3.827 -5.6 0 -1.5 -10 0 0
  [3,16,-9.239,0,-3.827,-5.6,0,-1.5,-10,0,0],
// 4 16 -10 0 0 -4.5 0 2.3 -7.071 0 7.071 -9.239 0 3.827
  [4,16,-10,0,0,-4.5,0,2.3,-7.071,0,7.071,-9.239,0,3.827],
// 3 16 -7.071 0 7.071 -4.5 0 2.3 -4.5 0 8.3
  [3,16,-7.071,0,7.071,-4.5,0,2.3,-4.5,0,8.3],
// 3 16 -4.5 0 8.3 -3.827 0 9.239 -7.071 0 7.071
  [3,16,-4.5,0,8.3,-3.827,0,9.239,-7.071,0,7.071],
// 4 16 -4.5 0 8.3 1.5 0 8.3 0 0 10 -3.827 0 9.239
  [4,16,-4.5,0,8.3,1.5,0,8.3,0,0,10,-3.827,0,9.239],
// 
// 0 BFC NOCLIP
  [0,"BFC","NOCLIP"],
// 4 0 -.4 0 4.2 -.4 0 6.4 -2.6 0 6.4 -2.6 0 4.2
  [4,0,-.4,0,4.2,-.4,0,6.4,-2.6,0,6.4,-2.6,0,4.2],
// 4 72 6.3 0 -2.6 6.3 0 -.4 4.1 0 -.4 4.1 0 -2.6
  [4,72,6.3,0,-2.6,6.3,0,-.4,4.1,0,-.4,4.1,0,-2.6],
// 4 72 -3.7 0 -3.4 -3.7 0 -5.6 -1.5 0 -5.6 -1.5 0 -3.4
  [4,72,-3.7,0,-3.4,-3.7,0,-5.6,-1.5,0,-5.6,-1.5,0,-3.4],
// 4 71 -.4 0 4.2 1.5 0 2.3 1.5 0 8.3 -.4 0 6.4
  [4,71,-.4,0,4.2,1.5,0,2.3,1.5,0,8.3,-.4,0,6.4],
// 4 71 1.5 0 2.3 -.4 0 4.2 -2.6 0 4.2 -4.5 0 2.3
  [4,71,1.5,0,2.3,-.4,0,4.2,-2.6,0,4.2,-4.5,0,2.3],
// 4 71 -4.5 0 2.3 -2.6 0 4.2 -2.6 0 6.4 -4.5 0 8.3
  [4,71,-4.5,0,2.3,-2.6,0,4.2,-2.6,0,6.4,-4.5,0,8.3],
// 4 71 1.5 0 8.3 -4.5 0 8.3 -2.6 0 6.4 -.4 0 6.4
  [4,71,1.5,0,8.3,-4.5,0,8.3,-2.6,0,6.4,-.4,0,6.4],
// 4 71 4.1 0 -2.6 4.1 0 -.4 2.2 0 1.5 2.2 0 -4.5
  [4,71,4.1,0,-2.6,4.1,0,-.4,2.2,0,1.5,2.2,0,-4.5],
// 4 71 4.1 0 -.4 6.3 0 -.4 8.2 0 1.5 2.2 0 1.5
  [4,71,4.1,0,-.4,6.3,0,-.4,8.2,0,1.5,2.2,0,1.5],
// 4 71 8.2 0 1.5 6.3 0 -.4 6.3 0 -2.6 8.2 0 -4.5
  [4,71,8.2,0,1.5,6.3,0,-.4,6.3,0,-2.6,8.2,0,-4.5],
// 4 71 8.2 0 -4.5 6.3 0 -2.6 4.1 0 -2.6 2.2 0 -4.5
  [4,71,8.2,0,-4.5,6.3,0,-2.6,4.1,0,-2.6,2.2,0,-4.5],
// 4 71 -3.7 0 -3.4 -1.5 0 -3.4 .4 0 -1.5 -5.6 0 -1.5
  [4,71,-3.7,0,-3.4,-1.5,0,-3.4,.4,0,-1.5,-5.6,0,-1.5],
// 4 71 .4 0 -1.5 -1.5 0 -3.4 -1.5 0 -5.6 .4 0 -7.5
  [4,71,.4,0,-1.5,-1.5,0,-3.4,-1.5,0,-5.6,.4,0,-7.5],
// 4 71 .4 0 -7.5 -1.5 0 -5.6 -3.7 0 -5.6 -5.6 0 -7.5
  [4,71,.4,0,-7.5,-1.5,0,-5.6,-3.7,0,-5.6,-5.6,0,-7.5],
// 4 71 -5.6 0 -7.5 -3.7 0 -5.6 -3.7 0 -3.4 -5.6 0 -1.5
  [4,71,-5.6,0,-7.5,-3.7,0,-5.6,-3.7,0,-3.4,-5.6,0,-1.5],
];
module ldraw_lib__98138pxj(step=0, col=false, unit=2/5, alt=false, line=0.2, solid=!$preview)
    makepoly(ldraw_lib__98138pxj(), step=step, col=col, unit=unit, alt=alt, line=line, solid=solid);
ldraw_lib__98138pxj(line=0.2);
